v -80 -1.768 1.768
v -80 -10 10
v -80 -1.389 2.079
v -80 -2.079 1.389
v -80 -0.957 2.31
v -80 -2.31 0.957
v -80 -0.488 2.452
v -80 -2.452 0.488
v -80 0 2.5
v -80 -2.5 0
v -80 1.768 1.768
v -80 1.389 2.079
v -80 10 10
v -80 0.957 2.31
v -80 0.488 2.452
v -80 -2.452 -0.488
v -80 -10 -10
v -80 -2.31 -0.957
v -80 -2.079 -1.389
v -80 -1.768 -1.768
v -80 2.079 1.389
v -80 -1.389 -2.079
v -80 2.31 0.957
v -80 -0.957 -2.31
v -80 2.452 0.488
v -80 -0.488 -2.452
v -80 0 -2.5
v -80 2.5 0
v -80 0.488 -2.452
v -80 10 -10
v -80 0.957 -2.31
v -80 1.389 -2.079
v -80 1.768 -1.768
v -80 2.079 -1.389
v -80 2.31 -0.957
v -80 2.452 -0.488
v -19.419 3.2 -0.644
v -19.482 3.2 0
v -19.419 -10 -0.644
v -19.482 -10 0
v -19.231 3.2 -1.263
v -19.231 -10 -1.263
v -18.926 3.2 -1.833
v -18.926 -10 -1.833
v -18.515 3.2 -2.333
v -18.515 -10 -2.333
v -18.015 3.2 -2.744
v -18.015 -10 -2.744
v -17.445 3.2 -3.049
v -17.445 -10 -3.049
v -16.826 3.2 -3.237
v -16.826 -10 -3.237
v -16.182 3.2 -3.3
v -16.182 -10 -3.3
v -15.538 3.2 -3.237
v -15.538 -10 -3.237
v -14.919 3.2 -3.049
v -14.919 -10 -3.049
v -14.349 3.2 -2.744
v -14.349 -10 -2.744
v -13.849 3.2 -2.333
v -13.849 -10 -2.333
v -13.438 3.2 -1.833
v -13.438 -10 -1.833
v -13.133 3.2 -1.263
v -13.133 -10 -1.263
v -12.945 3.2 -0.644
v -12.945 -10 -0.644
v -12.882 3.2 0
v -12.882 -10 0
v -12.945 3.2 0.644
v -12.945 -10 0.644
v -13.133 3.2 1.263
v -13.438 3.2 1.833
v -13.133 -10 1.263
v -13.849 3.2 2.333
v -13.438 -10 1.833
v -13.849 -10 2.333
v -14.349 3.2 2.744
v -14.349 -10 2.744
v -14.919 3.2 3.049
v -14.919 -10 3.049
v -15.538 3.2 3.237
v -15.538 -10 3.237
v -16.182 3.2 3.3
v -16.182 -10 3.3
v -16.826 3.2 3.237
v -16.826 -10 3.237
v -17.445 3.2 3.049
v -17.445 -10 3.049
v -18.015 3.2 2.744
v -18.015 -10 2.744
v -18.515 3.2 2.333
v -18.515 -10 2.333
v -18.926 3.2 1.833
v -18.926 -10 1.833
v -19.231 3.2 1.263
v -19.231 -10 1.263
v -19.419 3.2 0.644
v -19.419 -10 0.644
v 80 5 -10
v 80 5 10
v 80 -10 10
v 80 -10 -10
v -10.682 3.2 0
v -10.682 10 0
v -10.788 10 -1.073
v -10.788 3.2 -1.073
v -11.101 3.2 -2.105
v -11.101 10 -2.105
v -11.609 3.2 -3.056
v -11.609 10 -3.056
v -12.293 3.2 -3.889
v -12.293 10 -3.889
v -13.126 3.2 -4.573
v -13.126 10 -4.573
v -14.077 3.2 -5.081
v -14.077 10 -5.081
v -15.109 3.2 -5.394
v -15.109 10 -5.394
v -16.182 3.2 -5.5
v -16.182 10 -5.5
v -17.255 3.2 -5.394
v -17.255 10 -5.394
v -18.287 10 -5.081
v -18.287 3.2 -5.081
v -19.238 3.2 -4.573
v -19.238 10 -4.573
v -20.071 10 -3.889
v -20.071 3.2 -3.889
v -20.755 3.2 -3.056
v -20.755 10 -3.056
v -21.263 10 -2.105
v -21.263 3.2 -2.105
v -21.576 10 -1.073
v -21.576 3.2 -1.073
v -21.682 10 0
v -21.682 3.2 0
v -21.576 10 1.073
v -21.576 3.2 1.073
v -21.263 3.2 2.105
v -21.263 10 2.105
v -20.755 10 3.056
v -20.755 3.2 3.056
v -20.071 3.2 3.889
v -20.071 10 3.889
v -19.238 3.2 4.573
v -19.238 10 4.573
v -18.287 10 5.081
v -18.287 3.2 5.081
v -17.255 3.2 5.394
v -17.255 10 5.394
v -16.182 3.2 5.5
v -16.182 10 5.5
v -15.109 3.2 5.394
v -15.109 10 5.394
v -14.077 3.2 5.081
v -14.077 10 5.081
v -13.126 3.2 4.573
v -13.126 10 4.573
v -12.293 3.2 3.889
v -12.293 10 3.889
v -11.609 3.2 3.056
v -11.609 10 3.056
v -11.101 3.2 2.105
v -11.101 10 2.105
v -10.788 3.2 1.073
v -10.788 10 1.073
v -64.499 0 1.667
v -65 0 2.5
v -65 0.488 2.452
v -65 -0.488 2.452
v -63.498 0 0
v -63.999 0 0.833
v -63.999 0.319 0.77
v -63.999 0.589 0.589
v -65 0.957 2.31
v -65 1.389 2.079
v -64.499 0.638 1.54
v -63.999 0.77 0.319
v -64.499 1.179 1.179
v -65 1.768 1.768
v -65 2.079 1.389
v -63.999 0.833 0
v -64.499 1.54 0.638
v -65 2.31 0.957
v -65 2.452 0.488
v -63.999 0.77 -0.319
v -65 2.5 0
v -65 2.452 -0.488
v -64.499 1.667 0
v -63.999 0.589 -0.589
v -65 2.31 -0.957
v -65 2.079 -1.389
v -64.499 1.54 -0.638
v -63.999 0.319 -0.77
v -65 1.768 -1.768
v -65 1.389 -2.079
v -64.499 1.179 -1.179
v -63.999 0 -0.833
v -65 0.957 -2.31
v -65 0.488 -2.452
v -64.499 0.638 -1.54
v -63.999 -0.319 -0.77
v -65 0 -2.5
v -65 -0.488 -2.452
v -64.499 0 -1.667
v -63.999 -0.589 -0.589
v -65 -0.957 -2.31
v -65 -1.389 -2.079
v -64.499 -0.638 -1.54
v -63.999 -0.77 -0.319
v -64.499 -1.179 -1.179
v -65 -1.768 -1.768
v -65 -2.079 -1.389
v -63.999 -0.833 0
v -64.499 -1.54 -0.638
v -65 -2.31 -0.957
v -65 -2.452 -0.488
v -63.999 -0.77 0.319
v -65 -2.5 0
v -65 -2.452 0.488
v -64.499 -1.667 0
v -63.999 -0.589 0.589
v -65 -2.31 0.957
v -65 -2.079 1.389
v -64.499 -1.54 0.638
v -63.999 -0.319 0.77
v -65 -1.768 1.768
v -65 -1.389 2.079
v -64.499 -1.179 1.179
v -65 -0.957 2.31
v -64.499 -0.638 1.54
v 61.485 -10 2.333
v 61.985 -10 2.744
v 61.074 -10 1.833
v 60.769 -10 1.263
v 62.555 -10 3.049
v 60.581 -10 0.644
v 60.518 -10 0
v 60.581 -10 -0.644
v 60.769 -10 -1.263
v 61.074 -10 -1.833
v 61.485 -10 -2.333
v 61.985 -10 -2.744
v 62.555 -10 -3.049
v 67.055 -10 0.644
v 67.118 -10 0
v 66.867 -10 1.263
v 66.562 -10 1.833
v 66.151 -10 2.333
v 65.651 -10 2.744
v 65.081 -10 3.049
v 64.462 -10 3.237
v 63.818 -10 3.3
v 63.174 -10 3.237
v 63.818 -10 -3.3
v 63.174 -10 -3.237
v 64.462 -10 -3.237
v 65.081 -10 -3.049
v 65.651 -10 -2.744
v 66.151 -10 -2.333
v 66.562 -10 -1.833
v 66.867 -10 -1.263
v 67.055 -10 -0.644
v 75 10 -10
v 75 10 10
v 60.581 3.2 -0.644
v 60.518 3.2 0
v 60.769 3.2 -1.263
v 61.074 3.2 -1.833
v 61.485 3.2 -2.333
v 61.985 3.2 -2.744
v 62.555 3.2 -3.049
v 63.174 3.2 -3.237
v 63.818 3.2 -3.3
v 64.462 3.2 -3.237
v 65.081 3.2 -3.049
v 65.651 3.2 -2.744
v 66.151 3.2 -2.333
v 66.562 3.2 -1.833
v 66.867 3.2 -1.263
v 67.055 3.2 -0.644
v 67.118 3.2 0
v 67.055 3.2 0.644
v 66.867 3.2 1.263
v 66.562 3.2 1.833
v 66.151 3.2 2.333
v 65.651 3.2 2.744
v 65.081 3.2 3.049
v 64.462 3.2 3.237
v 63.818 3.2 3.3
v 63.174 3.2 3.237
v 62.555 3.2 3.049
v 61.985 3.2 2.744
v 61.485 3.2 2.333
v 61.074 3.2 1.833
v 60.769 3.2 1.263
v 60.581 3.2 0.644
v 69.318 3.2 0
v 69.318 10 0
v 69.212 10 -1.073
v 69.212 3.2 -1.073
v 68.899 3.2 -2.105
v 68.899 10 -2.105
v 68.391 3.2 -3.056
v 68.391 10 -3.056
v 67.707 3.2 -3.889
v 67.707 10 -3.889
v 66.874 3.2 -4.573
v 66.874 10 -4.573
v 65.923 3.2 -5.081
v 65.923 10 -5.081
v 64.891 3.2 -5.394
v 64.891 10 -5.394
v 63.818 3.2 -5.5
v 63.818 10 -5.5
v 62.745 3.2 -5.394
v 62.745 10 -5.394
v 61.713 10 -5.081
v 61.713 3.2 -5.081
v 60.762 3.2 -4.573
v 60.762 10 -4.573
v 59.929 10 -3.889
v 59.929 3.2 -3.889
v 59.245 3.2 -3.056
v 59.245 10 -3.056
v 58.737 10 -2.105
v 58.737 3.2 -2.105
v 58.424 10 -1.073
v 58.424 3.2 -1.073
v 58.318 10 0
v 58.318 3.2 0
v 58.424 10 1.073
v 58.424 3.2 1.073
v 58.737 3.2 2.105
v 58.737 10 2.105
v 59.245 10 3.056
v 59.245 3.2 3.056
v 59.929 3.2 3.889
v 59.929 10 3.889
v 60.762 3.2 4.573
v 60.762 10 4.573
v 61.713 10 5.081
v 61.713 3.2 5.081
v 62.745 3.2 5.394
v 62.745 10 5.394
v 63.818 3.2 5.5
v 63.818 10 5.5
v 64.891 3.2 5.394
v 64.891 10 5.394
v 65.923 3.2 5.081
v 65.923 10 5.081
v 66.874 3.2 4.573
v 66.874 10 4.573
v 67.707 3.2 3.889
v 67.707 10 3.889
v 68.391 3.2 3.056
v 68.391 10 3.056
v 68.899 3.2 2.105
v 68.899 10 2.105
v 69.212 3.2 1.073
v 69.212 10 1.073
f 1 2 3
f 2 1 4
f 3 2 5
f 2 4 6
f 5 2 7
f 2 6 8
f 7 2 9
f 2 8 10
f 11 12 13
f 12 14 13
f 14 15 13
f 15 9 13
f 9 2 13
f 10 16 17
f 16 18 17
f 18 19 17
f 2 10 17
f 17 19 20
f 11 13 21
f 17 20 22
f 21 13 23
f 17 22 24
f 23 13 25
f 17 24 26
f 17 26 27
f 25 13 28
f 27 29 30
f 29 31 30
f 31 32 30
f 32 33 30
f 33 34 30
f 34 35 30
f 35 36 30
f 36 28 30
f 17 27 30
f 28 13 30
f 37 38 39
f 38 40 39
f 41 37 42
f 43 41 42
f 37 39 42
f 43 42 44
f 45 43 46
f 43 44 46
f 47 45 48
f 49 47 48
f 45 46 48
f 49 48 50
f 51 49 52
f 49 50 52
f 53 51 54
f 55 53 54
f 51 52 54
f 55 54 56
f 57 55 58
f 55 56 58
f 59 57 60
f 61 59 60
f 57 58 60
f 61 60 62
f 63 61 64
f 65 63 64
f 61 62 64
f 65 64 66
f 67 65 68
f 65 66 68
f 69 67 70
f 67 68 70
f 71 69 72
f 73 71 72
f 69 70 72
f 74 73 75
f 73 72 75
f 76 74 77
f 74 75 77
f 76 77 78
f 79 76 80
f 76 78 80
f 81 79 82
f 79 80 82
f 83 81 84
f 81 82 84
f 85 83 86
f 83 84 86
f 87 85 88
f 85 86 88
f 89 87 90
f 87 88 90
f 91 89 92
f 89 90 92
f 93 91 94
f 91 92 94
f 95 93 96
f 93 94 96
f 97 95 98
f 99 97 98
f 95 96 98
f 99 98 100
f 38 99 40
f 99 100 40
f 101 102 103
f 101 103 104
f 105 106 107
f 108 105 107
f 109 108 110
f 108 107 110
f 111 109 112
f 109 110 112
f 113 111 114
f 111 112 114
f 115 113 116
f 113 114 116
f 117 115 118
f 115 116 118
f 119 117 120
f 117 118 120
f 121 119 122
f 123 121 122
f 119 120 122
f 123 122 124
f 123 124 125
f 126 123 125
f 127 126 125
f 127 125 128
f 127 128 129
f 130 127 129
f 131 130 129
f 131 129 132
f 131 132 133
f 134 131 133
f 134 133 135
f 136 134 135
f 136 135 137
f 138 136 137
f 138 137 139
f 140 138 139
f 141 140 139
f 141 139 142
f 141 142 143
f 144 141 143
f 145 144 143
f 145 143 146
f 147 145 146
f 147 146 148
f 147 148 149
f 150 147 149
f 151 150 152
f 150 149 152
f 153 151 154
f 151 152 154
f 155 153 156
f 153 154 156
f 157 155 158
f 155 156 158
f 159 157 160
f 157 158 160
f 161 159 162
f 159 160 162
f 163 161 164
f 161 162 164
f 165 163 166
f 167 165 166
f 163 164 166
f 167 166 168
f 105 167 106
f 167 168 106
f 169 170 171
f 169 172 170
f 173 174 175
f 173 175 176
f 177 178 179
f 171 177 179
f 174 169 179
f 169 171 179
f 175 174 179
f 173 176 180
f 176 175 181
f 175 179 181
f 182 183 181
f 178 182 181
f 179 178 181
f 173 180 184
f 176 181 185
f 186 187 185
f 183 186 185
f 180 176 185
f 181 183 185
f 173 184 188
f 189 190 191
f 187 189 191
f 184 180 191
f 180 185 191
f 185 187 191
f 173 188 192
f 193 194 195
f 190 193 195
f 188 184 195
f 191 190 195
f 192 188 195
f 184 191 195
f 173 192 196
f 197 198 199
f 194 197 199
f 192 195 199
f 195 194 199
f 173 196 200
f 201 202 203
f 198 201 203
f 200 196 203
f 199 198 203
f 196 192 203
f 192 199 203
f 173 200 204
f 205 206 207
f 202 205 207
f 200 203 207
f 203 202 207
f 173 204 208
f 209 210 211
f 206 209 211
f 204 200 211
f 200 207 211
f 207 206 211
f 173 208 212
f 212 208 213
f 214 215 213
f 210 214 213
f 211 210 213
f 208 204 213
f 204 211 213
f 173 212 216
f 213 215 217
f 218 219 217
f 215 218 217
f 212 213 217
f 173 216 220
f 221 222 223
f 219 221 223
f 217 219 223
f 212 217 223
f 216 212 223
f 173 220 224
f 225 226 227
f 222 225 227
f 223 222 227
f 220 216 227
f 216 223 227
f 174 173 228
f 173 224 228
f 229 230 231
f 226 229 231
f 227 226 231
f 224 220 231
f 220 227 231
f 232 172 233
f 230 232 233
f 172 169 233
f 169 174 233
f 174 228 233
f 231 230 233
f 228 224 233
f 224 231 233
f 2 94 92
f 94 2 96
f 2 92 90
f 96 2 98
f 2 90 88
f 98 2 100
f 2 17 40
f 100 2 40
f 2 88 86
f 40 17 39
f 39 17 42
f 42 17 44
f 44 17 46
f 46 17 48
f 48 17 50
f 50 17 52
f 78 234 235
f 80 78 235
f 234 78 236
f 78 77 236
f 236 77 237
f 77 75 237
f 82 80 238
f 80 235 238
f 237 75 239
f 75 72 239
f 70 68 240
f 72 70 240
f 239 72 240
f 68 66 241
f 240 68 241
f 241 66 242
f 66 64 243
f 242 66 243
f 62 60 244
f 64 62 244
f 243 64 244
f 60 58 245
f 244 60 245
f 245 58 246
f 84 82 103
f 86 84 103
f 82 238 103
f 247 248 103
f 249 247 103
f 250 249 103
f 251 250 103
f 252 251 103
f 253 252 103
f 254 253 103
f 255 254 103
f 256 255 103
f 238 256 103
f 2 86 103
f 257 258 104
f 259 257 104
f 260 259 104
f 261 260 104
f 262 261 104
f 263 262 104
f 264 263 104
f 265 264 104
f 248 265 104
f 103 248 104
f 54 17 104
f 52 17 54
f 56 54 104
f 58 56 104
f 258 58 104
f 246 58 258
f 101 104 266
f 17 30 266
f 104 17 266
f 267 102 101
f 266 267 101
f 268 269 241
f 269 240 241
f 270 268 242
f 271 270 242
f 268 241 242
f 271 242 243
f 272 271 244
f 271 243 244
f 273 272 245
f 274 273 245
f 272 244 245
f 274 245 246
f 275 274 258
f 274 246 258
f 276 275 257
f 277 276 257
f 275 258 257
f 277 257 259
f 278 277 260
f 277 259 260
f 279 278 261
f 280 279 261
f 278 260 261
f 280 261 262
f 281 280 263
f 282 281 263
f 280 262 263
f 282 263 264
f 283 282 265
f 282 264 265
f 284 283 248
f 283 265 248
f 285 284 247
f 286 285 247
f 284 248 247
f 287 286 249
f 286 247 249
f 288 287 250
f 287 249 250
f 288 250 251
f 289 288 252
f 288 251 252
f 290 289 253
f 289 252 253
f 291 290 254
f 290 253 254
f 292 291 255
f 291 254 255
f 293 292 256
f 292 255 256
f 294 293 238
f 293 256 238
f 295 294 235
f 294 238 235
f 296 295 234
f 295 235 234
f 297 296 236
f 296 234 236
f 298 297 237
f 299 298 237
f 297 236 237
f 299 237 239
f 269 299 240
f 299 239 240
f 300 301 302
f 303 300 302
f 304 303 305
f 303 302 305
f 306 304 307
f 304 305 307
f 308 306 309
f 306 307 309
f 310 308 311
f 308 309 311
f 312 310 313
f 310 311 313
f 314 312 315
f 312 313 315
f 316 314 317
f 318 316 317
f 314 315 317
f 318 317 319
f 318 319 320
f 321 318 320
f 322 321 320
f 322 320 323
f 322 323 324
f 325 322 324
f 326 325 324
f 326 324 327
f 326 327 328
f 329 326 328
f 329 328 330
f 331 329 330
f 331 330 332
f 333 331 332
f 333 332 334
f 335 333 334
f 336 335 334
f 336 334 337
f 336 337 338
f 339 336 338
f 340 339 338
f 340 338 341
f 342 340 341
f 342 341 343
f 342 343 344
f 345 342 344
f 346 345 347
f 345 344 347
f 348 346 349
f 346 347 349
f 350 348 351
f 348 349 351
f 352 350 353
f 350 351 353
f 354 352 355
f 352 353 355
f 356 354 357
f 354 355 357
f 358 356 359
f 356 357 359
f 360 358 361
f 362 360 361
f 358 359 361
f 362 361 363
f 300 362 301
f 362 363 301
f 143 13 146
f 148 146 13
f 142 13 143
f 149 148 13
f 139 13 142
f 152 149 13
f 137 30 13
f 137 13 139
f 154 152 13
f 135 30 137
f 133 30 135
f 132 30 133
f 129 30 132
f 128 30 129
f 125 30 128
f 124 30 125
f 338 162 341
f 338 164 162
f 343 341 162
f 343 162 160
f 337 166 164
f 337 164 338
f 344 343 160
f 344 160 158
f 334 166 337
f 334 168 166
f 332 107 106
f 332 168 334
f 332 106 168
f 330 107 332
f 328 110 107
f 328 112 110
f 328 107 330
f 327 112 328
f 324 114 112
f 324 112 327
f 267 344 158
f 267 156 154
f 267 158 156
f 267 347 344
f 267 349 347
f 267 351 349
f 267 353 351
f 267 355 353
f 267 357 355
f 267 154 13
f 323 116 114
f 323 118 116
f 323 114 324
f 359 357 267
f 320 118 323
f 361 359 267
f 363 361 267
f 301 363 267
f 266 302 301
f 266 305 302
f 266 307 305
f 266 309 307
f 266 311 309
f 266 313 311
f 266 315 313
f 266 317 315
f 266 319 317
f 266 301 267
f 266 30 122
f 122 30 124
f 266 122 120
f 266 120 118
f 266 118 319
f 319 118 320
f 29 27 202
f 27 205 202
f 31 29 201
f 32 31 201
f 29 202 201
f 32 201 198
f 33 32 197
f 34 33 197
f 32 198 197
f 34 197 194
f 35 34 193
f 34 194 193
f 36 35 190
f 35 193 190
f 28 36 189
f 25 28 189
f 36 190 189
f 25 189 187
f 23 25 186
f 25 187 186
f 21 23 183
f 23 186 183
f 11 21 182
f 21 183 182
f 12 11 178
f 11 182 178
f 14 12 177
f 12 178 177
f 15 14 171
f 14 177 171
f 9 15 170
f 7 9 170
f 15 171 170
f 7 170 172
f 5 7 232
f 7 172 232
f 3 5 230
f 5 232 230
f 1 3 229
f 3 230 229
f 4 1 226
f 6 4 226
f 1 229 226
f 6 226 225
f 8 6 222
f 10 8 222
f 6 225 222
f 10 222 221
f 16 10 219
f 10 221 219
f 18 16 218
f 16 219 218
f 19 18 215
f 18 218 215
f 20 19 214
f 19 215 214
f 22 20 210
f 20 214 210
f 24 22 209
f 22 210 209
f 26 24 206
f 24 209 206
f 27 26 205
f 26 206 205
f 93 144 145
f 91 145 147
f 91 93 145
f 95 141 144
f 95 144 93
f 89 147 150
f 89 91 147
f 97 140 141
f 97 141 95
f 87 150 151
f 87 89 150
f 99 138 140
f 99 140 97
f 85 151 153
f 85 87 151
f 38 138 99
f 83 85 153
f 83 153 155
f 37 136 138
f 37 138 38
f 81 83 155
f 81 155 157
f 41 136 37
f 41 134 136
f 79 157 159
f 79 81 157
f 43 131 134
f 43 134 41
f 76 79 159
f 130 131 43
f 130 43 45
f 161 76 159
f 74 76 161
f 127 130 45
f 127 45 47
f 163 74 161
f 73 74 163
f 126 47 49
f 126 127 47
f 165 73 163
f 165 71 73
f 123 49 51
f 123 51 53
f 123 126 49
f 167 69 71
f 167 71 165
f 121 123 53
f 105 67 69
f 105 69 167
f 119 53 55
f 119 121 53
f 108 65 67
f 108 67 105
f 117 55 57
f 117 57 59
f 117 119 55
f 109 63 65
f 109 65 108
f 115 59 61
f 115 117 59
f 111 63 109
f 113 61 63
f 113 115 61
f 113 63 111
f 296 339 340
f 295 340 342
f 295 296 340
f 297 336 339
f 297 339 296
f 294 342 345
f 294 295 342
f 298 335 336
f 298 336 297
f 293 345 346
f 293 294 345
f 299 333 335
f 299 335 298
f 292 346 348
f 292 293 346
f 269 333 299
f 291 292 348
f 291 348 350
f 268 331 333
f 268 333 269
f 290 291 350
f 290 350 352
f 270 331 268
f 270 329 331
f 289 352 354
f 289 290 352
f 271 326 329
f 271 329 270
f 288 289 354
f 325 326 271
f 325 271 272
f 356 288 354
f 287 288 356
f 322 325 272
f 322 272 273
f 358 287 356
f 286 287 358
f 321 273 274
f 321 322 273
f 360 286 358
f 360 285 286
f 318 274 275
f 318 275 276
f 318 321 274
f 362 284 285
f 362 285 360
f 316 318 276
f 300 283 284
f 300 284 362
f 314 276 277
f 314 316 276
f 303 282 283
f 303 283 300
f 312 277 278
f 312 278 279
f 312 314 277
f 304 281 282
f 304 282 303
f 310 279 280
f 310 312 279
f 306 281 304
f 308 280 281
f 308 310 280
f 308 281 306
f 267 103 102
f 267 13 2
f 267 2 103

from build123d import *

# Parameters (mm, degrees)
SKETCH1_W                                            = 160
SKETCH1_H                                            = 20
BOSS_EXTRUDE1_DEPTH                                  = 10
CBORE_FOR_M6_SLOTTED_CHEESE_HEAD_SCREWS2_D           = 6.6
CBORE_FOR_M6_SLOTTED_CHEESE_HEAD_SCREWS2_CBORE_D     = 11
CBORE_FOR_M6_SLOTTED_CHEESE_HEAD_SCREWS2_CBORE_DEPTH = 6.8
M6_TAPPED_HOLE1_D                                    = 5
M6_TAPPED_HOLE1_DEPTH                                = 15
M6_TAPPED_HOLE1_TIP                                  = 1.502151548
CHAMFER1_SIZE                                        = 5


with BuildPart() as part:
    # Sketch1 → Boss-Extrude1 (new, symmetric)
    with BuildSketch(Plane(origin=(0, 0, 0), x_dir=(1, 0, 0), z_dir=(0, 1, 0))):
        Rectangle(SKETCH1_W, SKETCH1_H)
    extrude(amount=BOSS_EXTRUDE1_DEPTH, both=True)

    # CBORE for M6 Slotted cheese head screws2 (through all)
    with Locations(Plane(origin=(0, 10, 0), x_dir=(1, 0, 0), z_dir=(0, 1, 0))):
        with Locations((-16.182, 0), (63.818, 0)):
            CounterBoreHole(CBORE_FOR_M6_SLOTTED_CHEESE_HEAD_SCREWS2_D / 2, CBORE_FOR_M6_SLOTTED_CHEESE_HEAD_SCREWS2_CBORE_D / 2, CBORE_FOR_M6_SLOTTED_CHEESE_HEAD_SCREWS2_CBORE_DEPTH)

    # M6 Tapped Hole1
    with Locations(Plane.ZY.offset(80)):
        with Locations((0, 0)):
            Hole(M6_TAPPED_HOLE1_D / 2, depth=M6_TAPPED_HOLE1_DEPTH)
            with Locations((0, 0, -(M6_TAPPED_HOLE1_DEPTH + M6_TAPPED_HOLE1_TIP / 2))):  # 118° drill point
                Cone(0, M6_TAPPED_HOLE1_D / 2, M6_TAPPED_HOLE1_TIP, mode=Mode.SUBTRACT)

    # Chamfer1
    chamfer1_edges = [part.edges().sort_by_distance(p)[0] for p in [
        (80, 10, 0),
    ]]
    chamfer(chamfer1_edges, length=CHAMFER1_SIZE)


solid = part.part
